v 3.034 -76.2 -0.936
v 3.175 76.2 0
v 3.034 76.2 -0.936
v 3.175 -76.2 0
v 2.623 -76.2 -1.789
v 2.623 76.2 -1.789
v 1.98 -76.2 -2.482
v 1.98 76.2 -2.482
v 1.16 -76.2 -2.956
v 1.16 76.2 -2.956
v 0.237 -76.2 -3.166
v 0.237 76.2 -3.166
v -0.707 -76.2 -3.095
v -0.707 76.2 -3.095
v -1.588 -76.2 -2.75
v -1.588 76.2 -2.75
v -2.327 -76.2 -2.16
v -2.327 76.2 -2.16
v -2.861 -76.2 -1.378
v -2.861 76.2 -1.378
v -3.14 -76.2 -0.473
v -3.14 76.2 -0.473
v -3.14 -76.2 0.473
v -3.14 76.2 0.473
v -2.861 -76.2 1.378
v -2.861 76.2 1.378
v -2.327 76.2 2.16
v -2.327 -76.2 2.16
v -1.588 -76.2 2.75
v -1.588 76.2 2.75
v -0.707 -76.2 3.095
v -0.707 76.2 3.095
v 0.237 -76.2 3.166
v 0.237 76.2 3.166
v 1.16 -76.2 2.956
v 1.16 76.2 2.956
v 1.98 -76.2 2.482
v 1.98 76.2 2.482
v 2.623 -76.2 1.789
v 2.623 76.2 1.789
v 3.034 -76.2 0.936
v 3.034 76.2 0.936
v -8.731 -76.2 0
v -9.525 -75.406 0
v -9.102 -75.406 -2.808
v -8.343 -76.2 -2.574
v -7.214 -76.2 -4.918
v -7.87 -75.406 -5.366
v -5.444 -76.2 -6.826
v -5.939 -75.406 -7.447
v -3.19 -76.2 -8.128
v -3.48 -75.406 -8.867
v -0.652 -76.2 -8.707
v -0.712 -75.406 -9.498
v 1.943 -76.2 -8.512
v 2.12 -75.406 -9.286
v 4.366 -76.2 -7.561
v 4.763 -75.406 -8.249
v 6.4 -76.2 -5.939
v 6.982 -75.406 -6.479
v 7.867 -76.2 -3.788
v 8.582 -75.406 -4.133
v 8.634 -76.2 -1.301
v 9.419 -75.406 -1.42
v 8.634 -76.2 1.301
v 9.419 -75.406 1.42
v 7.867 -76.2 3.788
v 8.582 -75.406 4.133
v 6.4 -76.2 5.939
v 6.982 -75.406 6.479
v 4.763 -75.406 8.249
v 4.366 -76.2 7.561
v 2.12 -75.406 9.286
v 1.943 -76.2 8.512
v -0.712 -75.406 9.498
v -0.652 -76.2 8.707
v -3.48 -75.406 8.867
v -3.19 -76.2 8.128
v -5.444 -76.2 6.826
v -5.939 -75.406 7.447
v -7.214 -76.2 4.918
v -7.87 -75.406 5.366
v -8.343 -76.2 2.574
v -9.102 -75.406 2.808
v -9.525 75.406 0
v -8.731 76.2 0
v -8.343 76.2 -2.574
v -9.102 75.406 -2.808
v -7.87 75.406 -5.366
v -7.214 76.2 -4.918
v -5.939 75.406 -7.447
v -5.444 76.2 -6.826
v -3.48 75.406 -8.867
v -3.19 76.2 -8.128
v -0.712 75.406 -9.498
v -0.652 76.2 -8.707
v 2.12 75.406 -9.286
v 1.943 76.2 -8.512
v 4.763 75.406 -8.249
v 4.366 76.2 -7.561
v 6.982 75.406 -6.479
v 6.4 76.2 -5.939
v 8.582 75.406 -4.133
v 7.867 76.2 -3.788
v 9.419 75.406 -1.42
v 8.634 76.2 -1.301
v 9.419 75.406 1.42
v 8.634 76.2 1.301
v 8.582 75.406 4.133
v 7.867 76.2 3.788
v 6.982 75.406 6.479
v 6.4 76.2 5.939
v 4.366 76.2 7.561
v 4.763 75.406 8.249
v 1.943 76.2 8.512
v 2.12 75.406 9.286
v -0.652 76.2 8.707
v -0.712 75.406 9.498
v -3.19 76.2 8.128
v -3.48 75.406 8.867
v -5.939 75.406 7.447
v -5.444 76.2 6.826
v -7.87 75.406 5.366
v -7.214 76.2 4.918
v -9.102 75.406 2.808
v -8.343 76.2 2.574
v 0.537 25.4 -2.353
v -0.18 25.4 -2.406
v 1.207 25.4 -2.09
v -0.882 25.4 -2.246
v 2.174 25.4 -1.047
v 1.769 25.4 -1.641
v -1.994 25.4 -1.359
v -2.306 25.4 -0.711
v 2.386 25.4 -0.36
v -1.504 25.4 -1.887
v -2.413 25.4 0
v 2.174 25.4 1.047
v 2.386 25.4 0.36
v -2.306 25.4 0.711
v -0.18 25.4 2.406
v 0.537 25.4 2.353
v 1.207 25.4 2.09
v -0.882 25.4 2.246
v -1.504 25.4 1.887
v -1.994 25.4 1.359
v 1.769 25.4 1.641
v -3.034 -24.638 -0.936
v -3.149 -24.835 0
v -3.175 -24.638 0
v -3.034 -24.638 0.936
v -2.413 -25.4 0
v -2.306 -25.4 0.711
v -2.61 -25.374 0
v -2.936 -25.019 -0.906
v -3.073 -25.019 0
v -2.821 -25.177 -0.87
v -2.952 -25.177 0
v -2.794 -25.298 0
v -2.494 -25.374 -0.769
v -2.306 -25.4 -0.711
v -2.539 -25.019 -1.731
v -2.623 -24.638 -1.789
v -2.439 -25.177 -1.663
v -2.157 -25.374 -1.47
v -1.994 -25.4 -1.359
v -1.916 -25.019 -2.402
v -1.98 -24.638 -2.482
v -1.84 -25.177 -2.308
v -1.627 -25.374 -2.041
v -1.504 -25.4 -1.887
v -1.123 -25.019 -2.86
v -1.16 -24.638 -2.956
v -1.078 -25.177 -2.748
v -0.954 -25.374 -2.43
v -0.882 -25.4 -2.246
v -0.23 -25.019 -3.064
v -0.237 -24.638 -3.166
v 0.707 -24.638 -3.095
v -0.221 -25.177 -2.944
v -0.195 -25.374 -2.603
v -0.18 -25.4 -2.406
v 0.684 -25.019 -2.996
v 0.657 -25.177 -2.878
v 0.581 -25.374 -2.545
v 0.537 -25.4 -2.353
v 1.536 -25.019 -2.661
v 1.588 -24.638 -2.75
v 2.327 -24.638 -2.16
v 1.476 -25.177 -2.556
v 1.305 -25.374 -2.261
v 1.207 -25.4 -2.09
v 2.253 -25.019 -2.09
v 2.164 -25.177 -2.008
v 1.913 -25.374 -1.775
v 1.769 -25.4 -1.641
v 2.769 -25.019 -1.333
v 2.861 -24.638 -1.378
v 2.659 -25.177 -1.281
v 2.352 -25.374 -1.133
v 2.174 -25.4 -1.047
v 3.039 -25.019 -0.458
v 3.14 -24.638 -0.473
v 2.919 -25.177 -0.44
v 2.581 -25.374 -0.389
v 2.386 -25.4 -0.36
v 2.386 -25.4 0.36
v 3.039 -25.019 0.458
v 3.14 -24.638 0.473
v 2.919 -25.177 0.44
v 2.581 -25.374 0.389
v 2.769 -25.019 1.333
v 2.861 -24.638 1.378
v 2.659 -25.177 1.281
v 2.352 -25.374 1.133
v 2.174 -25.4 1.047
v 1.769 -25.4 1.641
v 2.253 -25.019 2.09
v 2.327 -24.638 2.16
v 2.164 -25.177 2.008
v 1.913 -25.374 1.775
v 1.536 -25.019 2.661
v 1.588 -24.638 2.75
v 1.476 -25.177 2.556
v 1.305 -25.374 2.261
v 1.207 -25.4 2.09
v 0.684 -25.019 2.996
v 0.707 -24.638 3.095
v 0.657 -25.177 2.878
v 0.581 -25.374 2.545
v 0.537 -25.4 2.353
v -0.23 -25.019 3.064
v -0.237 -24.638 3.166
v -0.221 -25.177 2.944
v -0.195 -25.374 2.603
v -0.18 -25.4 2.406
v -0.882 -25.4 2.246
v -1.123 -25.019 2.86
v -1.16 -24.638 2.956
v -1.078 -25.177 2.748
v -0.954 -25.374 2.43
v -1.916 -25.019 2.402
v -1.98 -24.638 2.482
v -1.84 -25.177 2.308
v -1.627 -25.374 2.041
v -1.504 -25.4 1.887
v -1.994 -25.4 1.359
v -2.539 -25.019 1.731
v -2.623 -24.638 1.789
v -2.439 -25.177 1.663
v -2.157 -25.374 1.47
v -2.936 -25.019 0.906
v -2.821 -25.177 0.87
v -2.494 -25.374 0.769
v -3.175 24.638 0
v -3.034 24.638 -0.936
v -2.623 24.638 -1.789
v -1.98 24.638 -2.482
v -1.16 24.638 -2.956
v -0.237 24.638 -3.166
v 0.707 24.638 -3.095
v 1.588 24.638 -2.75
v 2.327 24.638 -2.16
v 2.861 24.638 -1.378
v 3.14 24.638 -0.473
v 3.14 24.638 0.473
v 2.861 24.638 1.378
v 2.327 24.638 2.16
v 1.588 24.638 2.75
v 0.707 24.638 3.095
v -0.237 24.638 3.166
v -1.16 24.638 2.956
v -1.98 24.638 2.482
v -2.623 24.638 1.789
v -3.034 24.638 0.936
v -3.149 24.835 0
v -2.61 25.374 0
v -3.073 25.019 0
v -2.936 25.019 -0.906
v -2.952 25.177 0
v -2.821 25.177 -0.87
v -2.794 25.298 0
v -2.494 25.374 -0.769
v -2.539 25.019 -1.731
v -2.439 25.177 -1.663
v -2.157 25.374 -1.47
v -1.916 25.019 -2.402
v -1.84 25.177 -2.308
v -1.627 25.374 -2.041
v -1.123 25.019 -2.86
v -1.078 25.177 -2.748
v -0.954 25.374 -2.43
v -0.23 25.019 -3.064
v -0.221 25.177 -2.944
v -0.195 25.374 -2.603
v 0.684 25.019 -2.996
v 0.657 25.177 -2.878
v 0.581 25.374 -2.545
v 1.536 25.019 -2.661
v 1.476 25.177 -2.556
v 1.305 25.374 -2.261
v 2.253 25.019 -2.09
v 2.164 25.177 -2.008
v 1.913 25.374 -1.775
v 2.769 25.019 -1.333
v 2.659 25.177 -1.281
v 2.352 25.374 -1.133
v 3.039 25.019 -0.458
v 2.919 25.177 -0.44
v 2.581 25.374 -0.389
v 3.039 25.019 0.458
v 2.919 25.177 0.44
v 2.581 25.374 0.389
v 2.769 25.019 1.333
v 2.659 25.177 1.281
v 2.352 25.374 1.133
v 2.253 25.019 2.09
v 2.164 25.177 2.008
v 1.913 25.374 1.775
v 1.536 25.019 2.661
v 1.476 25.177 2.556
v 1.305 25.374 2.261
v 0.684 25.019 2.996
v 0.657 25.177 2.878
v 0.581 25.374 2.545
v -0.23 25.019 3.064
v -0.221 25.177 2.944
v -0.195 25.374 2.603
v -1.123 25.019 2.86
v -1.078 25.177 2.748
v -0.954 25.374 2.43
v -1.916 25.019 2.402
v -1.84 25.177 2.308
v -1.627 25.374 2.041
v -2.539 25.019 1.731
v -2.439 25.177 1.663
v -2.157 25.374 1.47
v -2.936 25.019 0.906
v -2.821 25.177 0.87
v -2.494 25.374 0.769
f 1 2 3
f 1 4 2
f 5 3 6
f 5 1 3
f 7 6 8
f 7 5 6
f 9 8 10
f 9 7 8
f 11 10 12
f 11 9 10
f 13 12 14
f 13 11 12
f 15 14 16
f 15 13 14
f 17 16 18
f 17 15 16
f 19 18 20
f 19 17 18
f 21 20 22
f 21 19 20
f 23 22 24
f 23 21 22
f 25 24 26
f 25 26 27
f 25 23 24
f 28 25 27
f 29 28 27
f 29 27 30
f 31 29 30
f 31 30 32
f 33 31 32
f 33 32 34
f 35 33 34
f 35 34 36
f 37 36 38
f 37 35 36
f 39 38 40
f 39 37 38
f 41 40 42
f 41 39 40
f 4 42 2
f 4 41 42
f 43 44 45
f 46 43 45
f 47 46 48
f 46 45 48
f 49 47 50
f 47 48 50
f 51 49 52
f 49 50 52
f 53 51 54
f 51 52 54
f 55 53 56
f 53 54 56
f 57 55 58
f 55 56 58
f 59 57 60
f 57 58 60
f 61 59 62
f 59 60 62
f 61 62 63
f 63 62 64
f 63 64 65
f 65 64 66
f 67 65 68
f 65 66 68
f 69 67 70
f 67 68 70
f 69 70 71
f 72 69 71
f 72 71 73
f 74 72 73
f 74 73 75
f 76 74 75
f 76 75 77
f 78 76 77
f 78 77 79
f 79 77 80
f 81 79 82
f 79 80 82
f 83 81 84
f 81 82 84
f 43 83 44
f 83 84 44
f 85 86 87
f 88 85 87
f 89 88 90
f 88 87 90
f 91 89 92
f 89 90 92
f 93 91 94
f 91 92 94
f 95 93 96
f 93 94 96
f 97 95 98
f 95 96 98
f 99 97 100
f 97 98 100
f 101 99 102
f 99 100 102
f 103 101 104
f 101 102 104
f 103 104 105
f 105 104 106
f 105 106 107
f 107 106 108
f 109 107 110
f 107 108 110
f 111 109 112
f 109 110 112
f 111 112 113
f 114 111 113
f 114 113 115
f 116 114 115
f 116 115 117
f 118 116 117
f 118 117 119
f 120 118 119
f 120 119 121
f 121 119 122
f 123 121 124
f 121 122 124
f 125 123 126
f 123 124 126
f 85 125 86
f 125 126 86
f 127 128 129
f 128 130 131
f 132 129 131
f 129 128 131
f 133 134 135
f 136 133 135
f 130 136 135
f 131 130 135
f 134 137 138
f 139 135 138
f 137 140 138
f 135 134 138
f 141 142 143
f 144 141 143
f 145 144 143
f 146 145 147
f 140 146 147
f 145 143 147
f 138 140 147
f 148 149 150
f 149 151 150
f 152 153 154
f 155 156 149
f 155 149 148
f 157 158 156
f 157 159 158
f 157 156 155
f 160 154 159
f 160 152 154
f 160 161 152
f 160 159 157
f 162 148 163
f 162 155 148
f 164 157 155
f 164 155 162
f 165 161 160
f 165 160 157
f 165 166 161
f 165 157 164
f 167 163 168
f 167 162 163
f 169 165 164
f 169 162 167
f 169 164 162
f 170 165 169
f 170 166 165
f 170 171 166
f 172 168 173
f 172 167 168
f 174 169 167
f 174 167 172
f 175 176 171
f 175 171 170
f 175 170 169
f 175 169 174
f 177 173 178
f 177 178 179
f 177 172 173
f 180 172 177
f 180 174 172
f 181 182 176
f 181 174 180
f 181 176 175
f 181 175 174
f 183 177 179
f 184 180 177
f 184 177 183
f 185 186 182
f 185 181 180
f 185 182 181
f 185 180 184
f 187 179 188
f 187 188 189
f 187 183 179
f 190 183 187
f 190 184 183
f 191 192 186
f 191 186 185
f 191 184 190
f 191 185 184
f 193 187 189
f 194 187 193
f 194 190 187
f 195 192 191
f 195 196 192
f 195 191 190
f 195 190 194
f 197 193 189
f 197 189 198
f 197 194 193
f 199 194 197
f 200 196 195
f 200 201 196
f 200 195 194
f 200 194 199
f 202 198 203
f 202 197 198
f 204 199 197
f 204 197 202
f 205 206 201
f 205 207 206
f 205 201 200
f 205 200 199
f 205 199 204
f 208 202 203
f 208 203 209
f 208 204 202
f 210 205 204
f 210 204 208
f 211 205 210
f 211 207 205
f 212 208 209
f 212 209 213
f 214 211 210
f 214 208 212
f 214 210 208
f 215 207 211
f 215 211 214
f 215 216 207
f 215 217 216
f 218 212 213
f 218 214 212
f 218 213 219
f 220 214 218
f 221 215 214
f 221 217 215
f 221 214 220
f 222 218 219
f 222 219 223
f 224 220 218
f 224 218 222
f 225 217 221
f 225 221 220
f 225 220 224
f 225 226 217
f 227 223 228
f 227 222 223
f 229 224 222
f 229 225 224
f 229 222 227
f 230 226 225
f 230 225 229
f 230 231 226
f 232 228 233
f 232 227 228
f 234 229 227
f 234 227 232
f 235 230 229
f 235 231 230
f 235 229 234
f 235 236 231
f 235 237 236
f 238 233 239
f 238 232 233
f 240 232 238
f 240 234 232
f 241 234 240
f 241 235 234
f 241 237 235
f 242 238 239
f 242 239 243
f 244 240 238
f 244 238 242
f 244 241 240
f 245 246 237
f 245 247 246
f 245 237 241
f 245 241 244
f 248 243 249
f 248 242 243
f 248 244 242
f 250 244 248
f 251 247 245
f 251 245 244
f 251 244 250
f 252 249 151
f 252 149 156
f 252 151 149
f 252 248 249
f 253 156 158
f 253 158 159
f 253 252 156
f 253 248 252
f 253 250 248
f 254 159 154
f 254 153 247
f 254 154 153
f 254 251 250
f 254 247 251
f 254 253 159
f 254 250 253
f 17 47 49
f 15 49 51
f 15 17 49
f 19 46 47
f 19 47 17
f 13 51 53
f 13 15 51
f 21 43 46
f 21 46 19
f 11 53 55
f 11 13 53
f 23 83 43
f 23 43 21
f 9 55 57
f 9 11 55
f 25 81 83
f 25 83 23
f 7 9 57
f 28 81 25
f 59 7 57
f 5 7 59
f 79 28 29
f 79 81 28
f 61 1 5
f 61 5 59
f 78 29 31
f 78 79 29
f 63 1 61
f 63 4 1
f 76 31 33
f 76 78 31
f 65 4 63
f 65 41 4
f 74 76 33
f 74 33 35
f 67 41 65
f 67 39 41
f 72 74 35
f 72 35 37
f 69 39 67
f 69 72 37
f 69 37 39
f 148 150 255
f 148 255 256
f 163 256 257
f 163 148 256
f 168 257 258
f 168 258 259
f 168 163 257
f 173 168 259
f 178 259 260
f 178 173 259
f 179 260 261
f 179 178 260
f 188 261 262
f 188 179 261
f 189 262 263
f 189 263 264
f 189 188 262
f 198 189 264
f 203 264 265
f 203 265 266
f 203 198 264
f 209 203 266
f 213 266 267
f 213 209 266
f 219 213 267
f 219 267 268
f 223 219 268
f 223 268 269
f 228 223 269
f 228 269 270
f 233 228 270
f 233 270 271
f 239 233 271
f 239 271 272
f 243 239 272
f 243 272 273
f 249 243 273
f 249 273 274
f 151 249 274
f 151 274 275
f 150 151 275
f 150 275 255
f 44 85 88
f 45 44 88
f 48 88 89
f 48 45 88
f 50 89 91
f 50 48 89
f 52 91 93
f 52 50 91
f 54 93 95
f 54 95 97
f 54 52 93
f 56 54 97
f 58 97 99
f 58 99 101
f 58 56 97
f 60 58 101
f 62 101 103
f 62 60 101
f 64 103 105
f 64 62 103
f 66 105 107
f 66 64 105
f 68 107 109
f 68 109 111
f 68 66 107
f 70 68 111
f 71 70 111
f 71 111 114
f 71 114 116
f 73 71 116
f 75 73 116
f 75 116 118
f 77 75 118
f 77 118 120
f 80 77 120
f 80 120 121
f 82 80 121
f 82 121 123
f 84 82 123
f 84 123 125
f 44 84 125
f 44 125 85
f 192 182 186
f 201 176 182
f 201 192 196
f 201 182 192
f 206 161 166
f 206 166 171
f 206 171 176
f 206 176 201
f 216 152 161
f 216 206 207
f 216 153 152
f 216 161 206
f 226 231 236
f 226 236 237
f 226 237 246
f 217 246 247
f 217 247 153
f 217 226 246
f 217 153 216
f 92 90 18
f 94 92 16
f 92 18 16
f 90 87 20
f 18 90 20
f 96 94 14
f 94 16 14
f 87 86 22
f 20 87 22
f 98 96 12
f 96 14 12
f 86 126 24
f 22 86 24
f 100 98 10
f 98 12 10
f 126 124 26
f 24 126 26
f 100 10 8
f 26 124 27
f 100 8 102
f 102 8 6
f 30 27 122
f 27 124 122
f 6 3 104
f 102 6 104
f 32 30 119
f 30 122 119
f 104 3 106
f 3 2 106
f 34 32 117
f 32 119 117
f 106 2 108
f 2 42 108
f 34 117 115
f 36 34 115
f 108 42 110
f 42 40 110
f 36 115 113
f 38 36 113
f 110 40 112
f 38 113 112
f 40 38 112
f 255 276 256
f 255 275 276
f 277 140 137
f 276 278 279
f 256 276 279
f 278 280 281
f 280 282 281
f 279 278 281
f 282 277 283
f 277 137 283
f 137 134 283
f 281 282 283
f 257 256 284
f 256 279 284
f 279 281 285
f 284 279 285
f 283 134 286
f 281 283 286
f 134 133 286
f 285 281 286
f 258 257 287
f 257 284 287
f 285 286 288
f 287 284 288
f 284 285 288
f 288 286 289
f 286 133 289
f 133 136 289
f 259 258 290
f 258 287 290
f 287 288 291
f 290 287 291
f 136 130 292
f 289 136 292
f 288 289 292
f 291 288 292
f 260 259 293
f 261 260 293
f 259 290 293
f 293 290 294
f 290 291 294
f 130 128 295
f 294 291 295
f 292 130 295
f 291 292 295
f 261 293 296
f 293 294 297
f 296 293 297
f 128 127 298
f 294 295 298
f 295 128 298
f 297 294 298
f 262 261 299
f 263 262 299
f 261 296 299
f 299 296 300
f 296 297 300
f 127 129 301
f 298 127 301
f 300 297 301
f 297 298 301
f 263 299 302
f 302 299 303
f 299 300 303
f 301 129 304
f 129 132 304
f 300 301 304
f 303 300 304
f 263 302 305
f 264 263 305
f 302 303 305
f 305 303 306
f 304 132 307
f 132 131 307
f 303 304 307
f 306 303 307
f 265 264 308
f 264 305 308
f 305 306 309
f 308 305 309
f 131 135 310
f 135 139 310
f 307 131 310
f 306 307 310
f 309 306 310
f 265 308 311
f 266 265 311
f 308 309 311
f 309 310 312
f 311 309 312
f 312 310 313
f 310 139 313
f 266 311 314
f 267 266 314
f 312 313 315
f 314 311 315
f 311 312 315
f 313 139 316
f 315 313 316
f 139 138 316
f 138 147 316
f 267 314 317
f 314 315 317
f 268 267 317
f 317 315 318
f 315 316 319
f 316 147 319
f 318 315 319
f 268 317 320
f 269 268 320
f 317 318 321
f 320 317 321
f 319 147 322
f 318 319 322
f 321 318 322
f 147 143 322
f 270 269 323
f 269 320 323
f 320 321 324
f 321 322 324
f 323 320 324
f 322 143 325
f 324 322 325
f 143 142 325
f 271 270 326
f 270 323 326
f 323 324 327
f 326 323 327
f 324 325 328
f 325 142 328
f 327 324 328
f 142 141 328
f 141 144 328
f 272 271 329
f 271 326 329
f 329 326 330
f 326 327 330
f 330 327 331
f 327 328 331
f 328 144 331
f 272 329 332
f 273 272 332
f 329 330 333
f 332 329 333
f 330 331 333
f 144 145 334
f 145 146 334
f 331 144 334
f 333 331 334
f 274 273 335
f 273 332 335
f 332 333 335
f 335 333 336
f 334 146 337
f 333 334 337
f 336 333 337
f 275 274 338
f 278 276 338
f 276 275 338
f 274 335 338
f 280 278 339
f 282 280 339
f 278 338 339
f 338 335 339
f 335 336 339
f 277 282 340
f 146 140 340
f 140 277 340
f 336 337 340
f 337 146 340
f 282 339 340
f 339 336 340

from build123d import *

# Parameters (mm, degrees)
F1_DEPTH = 76.2
F2_SIZE  = 0.79375
F3_DEPTH = 25.4
F4_R     = 0.762


with BuildPart() as f1:
    # F0 (on Front) → F1 (new body, symmetric)
    with BuildSketch(Plane.XZ):
        with BuildLine():
            ThreePointArc((-3.175, 0), (0, 3.175), (3.175, 0))
            Line((3.175, 0), (9.525, 0))
            ThreePointArc((9.525, 0), (0, 9.525), (-9.525, 0))
            Line((-9.525, 0), (-3.175, 0))
        make_face()
        with BuildLine():
            Line((9.525, 0), (3.175, 0))
            ThreePointArc((3.175, 0), (0, -3.175), (-3.175, 0))
            Line((-3.175, 0), (-9.525, 0))
            ThreePointArc((-9.525, 0), (0, -9.525), (9.525, 0))
        make_face()
    extrude(amount=F1_DEPTH, both=True)

    # F2
    f2_edges = [f1.edges().sort_by_distance(p)[0] for p in [
        (9.525, 76.2, 0),
        (9.525, -76.2, 0),
    ]]
    chamfer(f2_edges, length=F2_SIZE)


with BuildPart() as f3:
    # F0 (on Front) → F3 (new body, symmetric)
    with BuildSketch(Plane.XZ):
        with BuildLine():
            Line((-3.175, 0), (3.175, 0))
            ThreePointArc((3.175, 0), (0, 3.175), (-3.175, 0))
        make_face()
        with BuildLine():
            ThreePointArc((-3.175, 0), (0, -3.175), (3.175, 0))
            Line((3.175, 0), (-3.175, 0))
        make_face()
    extrude(amount=F3_DEPTH, both=True)

    # F4
    f4_edges = [f3.edges().sort_by_distance(p)[0] for p in [
        (3.175, -25.4, 0),
        (3.175, 25.4, 0),
    ]]
    fillet(f4_edges, radius=F4_R)


solid = Compound([f1.part, f3.part])
